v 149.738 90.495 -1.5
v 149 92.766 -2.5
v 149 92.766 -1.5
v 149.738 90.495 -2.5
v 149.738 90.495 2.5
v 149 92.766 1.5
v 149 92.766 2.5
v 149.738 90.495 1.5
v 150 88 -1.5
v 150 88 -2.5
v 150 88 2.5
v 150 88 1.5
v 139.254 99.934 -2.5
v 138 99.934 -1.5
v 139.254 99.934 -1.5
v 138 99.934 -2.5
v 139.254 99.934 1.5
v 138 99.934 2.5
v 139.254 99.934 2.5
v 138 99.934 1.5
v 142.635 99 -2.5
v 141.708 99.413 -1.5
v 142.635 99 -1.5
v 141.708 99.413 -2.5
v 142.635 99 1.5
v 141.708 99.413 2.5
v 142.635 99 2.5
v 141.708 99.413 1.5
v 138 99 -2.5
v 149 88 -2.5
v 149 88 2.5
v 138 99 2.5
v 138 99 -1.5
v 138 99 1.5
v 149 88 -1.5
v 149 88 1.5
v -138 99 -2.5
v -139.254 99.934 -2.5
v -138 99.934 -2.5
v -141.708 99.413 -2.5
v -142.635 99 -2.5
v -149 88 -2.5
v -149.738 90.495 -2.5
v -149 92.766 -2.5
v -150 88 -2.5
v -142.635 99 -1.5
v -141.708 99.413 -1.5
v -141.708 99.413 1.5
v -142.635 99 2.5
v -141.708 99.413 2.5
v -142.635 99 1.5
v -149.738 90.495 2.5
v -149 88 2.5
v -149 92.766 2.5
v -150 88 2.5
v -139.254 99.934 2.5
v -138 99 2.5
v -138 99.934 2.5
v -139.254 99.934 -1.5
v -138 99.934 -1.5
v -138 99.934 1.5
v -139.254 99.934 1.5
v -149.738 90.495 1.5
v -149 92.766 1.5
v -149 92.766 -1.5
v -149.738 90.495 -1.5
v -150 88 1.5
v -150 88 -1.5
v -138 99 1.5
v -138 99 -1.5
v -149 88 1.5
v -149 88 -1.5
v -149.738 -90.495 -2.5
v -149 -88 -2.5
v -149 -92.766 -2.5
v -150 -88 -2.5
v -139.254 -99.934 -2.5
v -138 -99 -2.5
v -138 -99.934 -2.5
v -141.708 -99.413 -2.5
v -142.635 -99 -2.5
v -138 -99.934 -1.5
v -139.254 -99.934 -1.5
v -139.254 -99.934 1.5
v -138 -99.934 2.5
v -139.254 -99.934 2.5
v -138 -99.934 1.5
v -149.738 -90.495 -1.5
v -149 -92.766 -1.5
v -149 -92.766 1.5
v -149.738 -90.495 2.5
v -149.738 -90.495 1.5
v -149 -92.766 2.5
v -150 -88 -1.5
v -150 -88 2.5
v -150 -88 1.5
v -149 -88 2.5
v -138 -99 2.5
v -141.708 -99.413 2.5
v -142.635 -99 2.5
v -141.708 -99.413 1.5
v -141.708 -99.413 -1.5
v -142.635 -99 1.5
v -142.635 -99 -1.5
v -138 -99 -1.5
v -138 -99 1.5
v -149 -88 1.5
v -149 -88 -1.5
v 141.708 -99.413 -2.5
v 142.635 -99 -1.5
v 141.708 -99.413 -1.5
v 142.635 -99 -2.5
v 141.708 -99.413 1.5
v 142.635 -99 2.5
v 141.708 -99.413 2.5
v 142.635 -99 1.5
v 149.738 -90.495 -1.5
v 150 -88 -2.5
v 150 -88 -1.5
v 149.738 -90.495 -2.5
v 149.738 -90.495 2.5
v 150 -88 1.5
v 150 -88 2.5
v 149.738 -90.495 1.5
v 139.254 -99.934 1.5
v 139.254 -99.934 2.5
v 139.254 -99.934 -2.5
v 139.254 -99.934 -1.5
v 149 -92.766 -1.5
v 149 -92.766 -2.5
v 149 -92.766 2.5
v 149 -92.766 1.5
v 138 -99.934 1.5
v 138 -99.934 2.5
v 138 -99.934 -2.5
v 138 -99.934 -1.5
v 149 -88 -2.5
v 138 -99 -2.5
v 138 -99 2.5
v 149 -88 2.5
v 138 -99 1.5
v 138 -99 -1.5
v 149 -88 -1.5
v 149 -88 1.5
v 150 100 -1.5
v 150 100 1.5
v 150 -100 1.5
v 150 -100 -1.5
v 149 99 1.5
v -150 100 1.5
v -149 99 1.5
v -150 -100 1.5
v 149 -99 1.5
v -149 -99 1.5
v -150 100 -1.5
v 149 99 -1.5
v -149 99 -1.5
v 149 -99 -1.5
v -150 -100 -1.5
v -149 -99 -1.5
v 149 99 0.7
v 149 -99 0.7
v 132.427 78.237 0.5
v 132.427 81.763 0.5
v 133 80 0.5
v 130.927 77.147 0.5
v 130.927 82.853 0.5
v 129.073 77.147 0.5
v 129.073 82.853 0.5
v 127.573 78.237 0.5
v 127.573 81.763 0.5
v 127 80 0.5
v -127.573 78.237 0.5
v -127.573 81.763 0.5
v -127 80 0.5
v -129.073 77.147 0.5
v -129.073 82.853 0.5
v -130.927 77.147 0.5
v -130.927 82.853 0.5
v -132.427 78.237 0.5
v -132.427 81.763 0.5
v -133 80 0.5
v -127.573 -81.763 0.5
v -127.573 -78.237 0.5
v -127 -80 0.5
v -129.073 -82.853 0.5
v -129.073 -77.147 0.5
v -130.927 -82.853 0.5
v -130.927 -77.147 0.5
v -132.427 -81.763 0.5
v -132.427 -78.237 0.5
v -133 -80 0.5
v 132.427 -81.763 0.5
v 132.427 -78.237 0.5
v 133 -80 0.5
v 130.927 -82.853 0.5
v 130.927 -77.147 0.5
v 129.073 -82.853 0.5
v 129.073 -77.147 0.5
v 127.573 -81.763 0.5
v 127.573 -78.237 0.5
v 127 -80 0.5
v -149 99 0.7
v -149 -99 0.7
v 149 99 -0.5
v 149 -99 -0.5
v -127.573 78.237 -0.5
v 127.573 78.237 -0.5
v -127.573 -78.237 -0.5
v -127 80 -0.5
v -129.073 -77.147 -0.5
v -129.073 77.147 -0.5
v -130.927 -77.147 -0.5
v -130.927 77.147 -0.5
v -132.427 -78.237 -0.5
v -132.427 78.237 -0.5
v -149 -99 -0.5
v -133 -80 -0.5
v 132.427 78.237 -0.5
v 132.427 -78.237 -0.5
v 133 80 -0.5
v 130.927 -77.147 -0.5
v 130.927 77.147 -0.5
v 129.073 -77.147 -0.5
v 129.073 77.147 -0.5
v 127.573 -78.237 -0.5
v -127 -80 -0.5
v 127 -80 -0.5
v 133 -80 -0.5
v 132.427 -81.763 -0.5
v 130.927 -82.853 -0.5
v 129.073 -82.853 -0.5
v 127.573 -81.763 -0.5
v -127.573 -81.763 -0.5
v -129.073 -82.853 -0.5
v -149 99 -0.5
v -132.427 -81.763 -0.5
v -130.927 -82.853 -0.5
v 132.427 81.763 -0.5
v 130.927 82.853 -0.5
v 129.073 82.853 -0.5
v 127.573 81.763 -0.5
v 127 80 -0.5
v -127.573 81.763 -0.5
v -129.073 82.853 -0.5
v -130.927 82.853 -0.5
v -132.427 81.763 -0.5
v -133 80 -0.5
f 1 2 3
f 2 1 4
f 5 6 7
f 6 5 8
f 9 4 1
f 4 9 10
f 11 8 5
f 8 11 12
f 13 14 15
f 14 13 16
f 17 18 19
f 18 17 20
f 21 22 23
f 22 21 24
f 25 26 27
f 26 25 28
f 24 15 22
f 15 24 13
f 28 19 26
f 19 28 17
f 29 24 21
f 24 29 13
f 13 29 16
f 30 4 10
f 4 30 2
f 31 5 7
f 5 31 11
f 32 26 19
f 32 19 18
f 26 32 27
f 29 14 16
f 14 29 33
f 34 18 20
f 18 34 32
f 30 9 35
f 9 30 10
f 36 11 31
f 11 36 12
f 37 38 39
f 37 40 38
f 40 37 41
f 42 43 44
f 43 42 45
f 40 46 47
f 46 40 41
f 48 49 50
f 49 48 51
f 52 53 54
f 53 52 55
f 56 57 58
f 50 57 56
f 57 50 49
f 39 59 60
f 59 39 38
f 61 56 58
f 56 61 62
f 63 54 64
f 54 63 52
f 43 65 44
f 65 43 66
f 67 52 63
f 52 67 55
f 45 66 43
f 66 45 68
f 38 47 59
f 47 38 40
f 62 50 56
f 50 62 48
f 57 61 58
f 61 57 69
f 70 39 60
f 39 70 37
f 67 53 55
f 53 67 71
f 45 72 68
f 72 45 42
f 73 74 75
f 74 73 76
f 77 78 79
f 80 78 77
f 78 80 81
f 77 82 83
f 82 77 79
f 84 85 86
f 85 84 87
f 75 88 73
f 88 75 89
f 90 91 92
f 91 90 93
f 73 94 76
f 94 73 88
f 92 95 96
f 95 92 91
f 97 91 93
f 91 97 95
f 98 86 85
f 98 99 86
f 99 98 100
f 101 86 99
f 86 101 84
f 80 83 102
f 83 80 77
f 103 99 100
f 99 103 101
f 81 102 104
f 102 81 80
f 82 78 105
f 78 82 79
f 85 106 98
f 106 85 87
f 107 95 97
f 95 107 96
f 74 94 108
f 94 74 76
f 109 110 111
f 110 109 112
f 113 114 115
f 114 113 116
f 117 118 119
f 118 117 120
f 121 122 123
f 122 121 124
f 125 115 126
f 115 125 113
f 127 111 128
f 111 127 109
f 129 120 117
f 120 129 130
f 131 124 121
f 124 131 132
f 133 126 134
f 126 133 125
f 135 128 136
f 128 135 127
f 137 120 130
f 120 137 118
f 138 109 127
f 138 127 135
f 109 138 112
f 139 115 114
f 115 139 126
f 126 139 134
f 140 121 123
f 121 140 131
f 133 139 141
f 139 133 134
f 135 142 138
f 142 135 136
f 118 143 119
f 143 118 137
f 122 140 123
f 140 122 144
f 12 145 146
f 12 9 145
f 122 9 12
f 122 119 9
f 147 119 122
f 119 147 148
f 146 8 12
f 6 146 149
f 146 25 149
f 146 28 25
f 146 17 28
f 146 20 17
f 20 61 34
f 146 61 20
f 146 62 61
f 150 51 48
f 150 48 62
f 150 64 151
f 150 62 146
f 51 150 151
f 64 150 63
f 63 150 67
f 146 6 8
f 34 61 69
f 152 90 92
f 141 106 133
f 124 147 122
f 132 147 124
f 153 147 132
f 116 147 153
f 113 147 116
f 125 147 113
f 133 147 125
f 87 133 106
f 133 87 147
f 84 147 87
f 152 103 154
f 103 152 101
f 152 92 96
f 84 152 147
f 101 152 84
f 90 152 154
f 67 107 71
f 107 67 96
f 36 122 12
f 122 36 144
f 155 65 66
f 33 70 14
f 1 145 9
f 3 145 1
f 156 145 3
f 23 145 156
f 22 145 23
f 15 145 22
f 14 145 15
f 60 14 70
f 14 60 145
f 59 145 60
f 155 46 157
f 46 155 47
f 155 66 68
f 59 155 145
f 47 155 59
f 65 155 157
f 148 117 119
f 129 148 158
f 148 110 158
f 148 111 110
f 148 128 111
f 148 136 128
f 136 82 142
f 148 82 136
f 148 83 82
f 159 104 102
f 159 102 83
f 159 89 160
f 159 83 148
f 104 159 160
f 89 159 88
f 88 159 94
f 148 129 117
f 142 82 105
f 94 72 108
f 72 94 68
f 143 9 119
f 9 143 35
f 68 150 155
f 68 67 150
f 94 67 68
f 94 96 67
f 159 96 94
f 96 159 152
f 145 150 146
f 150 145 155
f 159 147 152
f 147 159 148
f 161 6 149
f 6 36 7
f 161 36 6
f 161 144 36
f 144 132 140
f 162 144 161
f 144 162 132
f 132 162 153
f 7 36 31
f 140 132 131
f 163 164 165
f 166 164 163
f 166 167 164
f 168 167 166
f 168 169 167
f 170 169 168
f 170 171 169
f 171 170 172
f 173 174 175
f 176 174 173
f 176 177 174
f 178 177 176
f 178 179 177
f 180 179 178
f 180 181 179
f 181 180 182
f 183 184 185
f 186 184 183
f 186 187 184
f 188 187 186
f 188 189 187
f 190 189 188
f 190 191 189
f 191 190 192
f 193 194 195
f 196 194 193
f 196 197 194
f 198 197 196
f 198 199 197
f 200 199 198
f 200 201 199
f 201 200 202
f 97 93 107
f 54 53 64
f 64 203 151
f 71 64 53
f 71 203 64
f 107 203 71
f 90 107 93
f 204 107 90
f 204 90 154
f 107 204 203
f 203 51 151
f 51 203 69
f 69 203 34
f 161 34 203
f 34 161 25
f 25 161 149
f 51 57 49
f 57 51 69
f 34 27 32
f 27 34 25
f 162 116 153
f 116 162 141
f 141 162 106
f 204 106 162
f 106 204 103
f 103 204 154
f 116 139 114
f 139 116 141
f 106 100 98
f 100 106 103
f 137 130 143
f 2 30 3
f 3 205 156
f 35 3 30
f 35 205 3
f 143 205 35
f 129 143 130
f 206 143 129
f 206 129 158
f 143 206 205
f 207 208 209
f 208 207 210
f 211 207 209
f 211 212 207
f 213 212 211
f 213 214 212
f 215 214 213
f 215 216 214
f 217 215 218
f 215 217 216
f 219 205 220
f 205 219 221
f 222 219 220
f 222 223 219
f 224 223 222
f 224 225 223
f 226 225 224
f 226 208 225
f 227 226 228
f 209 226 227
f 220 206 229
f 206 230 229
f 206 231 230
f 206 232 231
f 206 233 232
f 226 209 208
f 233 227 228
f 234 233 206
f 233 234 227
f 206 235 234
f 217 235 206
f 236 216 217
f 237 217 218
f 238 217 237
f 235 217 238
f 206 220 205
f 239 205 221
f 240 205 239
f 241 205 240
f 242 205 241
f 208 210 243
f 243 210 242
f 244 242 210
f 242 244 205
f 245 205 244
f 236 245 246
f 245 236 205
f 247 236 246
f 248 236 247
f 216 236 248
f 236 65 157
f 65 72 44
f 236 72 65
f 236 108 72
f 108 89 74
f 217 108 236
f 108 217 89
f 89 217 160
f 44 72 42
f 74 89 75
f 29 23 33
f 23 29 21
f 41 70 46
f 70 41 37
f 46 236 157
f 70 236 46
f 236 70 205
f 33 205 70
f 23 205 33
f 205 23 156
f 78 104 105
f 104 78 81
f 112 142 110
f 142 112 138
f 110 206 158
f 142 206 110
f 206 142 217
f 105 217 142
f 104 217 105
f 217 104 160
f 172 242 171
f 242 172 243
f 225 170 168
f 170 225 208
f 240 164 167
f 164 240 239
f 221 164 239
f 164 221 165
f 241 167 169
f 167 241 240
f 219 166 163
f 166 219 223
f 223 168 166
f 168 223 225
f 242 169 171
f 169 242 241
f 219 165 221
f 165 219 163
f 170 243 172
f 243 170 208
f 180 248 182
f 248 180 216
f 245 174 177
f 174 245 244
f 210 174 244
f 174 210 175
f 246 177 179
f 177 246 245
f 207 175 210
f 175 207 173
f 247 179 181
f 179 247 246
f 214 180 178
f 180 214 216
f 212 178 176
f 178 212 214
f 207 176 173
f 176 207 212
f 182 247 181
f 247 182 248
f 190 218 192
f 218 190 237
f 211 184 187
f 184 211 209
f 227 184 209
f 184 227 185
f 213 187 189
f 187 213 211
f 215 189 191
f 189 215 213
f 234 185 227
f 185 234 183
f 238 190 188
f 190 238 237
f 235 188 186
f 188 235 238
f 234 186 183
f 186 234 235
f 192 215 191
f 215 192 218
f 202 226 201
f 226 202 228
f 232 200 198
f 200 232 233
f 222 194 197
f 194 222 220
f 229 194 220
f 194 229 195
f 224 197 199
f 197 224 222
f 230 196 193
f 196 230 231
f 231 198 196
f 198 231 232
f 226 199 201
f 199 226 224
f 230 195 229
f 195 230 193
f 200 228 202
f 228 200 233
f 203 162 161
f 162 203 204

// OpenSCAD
// Parameters
sheet_length = 300; //[150:600:1]
sheet_width = 200; //[100:400:1]
sheet_thickness = 3; //[1.5:6:0.5]
corner_radius = 12; //[6:24:1]
chamfer_size = 1; //[0.5:3:0.5]
hole_diameter = 6; //[3:12:0.5]
hole_edge_offset = 20; //[10:40:1]
film_thickness = 0.2; //[0.05:0.5:0.05]
overlap = 1; //[0.5:2:0.5]

// Base shapes
module acrylic_sheet() {
  cube([sheet_length, sheet_width, sheet_thickness], center=true);
}

module rounded_corner_cyl(pos) {
  translate(pos)
    cylinder(r=corner_radius, h=sheet_thickness + 2*overlap, center=true);
}

module rounded_corner_cut(pos) {
  translate(pos)
    cube([corner_radius, corner_radius, sheet_thickness + 2*overlap], center=true);
}

module chamfer_inset(z_pos) {
  translate([0, 0, z_pos])
    cube([sheet_length - 2*chamfer_size, sheet_width - 2*chamfer_size, sheet_thickness + 2*overlap], center=true);
}

module mounting_hole(pos) {
  translate(pos)
    cylinder(r=hole_diameter/2, h=sheet_thickness + 2*overlap, center=true);
}

module protective_film_layer() {
  translate([0, 0, sheet_thickness/2 + film_thickness/2 - overlap])
    cube([sheet_length, sheet_width, film_thickness], center=true);
}

// Operations
module rounded_corners() {
  union() {
    intersection() {
      rounded_corner_cyl([sheet_length/2 - corner_radius, sheet_width/2 - corner_radius, 0]);
      rounded_corner_cut([sheet_length/2 - corner_radius/2, sheet_width/2 - corner_radius/2, 0]);
    }
    intersection() {
      rounded_corner_cyl([-sheet_length/2 + corner_radius, sheet_width/2 - corner_radius, 0]);
      rounded_corner_cut([-sheet_length/2 + corner_radius/2, sheet_width/2 - corner_radius/2, 0]);
    }
    intersection() {
      rounded_corner_cyl([-sheet_length/2 + corner_radius, -sheet_width/2 + corner_radius, 0]);
      rounded_corner_cut([-sheet_length/2 + corner_radius/2, -sheet_width/2 + corner_radius/2, 0]);
    }
    intersection() {
      rounded_corner_cyl([sheet_length/2 - corner_radius, -sheet_width/2 + corner_radius, 0]);
      rounded_corner_cut([sheet_length/2 - corner_radius/2, -sheet_width/2 + corner_radius/2, 0]);
    }
  }
}

module sheet_with_rounded_corners() {
  union() {
    acrylic_sheet();
    rounded_corners();
  }
}

module chamfered_edges() {
  difference() {
    sheet_with_rounded_corners();
    chamfer_inset(sheet_thickness/2 + (sheet_thickness + 2*overlap)/2 - overlap);
    chamfer_inset(-sheet_thickness/2 - (sheet_thickness + 2*overlap)/2 + overlap);
  }
}

module mounting_holes() {
  difference() {
    chamfered_edges();
    mounting_hole([sheet_length/2 - hole_edge_offset, sheet_width/2 - hole_edge_offset, 0]);
    mounting_hole([-sheet_length/2 + hole_edge_offset, sheet_width/2 - hole_edge_offset, 0]);
    mounting_hole([-sheet_length/2 + hole_edge_offset, -sheet_width/2 + hole_edge_offset, 0]);
    mounting_hole([sheet_length/2 - hole_edge_offset, -sheet_width/2 + hole_edge_offset, 0]);
  }
}

// Final model
module complete_model() {
  union() {
    mounting_holes();
    protective_film_layer();
  }
}

// Render the complete model
color([0.85, 0.85, 0.8]) complete_model();
